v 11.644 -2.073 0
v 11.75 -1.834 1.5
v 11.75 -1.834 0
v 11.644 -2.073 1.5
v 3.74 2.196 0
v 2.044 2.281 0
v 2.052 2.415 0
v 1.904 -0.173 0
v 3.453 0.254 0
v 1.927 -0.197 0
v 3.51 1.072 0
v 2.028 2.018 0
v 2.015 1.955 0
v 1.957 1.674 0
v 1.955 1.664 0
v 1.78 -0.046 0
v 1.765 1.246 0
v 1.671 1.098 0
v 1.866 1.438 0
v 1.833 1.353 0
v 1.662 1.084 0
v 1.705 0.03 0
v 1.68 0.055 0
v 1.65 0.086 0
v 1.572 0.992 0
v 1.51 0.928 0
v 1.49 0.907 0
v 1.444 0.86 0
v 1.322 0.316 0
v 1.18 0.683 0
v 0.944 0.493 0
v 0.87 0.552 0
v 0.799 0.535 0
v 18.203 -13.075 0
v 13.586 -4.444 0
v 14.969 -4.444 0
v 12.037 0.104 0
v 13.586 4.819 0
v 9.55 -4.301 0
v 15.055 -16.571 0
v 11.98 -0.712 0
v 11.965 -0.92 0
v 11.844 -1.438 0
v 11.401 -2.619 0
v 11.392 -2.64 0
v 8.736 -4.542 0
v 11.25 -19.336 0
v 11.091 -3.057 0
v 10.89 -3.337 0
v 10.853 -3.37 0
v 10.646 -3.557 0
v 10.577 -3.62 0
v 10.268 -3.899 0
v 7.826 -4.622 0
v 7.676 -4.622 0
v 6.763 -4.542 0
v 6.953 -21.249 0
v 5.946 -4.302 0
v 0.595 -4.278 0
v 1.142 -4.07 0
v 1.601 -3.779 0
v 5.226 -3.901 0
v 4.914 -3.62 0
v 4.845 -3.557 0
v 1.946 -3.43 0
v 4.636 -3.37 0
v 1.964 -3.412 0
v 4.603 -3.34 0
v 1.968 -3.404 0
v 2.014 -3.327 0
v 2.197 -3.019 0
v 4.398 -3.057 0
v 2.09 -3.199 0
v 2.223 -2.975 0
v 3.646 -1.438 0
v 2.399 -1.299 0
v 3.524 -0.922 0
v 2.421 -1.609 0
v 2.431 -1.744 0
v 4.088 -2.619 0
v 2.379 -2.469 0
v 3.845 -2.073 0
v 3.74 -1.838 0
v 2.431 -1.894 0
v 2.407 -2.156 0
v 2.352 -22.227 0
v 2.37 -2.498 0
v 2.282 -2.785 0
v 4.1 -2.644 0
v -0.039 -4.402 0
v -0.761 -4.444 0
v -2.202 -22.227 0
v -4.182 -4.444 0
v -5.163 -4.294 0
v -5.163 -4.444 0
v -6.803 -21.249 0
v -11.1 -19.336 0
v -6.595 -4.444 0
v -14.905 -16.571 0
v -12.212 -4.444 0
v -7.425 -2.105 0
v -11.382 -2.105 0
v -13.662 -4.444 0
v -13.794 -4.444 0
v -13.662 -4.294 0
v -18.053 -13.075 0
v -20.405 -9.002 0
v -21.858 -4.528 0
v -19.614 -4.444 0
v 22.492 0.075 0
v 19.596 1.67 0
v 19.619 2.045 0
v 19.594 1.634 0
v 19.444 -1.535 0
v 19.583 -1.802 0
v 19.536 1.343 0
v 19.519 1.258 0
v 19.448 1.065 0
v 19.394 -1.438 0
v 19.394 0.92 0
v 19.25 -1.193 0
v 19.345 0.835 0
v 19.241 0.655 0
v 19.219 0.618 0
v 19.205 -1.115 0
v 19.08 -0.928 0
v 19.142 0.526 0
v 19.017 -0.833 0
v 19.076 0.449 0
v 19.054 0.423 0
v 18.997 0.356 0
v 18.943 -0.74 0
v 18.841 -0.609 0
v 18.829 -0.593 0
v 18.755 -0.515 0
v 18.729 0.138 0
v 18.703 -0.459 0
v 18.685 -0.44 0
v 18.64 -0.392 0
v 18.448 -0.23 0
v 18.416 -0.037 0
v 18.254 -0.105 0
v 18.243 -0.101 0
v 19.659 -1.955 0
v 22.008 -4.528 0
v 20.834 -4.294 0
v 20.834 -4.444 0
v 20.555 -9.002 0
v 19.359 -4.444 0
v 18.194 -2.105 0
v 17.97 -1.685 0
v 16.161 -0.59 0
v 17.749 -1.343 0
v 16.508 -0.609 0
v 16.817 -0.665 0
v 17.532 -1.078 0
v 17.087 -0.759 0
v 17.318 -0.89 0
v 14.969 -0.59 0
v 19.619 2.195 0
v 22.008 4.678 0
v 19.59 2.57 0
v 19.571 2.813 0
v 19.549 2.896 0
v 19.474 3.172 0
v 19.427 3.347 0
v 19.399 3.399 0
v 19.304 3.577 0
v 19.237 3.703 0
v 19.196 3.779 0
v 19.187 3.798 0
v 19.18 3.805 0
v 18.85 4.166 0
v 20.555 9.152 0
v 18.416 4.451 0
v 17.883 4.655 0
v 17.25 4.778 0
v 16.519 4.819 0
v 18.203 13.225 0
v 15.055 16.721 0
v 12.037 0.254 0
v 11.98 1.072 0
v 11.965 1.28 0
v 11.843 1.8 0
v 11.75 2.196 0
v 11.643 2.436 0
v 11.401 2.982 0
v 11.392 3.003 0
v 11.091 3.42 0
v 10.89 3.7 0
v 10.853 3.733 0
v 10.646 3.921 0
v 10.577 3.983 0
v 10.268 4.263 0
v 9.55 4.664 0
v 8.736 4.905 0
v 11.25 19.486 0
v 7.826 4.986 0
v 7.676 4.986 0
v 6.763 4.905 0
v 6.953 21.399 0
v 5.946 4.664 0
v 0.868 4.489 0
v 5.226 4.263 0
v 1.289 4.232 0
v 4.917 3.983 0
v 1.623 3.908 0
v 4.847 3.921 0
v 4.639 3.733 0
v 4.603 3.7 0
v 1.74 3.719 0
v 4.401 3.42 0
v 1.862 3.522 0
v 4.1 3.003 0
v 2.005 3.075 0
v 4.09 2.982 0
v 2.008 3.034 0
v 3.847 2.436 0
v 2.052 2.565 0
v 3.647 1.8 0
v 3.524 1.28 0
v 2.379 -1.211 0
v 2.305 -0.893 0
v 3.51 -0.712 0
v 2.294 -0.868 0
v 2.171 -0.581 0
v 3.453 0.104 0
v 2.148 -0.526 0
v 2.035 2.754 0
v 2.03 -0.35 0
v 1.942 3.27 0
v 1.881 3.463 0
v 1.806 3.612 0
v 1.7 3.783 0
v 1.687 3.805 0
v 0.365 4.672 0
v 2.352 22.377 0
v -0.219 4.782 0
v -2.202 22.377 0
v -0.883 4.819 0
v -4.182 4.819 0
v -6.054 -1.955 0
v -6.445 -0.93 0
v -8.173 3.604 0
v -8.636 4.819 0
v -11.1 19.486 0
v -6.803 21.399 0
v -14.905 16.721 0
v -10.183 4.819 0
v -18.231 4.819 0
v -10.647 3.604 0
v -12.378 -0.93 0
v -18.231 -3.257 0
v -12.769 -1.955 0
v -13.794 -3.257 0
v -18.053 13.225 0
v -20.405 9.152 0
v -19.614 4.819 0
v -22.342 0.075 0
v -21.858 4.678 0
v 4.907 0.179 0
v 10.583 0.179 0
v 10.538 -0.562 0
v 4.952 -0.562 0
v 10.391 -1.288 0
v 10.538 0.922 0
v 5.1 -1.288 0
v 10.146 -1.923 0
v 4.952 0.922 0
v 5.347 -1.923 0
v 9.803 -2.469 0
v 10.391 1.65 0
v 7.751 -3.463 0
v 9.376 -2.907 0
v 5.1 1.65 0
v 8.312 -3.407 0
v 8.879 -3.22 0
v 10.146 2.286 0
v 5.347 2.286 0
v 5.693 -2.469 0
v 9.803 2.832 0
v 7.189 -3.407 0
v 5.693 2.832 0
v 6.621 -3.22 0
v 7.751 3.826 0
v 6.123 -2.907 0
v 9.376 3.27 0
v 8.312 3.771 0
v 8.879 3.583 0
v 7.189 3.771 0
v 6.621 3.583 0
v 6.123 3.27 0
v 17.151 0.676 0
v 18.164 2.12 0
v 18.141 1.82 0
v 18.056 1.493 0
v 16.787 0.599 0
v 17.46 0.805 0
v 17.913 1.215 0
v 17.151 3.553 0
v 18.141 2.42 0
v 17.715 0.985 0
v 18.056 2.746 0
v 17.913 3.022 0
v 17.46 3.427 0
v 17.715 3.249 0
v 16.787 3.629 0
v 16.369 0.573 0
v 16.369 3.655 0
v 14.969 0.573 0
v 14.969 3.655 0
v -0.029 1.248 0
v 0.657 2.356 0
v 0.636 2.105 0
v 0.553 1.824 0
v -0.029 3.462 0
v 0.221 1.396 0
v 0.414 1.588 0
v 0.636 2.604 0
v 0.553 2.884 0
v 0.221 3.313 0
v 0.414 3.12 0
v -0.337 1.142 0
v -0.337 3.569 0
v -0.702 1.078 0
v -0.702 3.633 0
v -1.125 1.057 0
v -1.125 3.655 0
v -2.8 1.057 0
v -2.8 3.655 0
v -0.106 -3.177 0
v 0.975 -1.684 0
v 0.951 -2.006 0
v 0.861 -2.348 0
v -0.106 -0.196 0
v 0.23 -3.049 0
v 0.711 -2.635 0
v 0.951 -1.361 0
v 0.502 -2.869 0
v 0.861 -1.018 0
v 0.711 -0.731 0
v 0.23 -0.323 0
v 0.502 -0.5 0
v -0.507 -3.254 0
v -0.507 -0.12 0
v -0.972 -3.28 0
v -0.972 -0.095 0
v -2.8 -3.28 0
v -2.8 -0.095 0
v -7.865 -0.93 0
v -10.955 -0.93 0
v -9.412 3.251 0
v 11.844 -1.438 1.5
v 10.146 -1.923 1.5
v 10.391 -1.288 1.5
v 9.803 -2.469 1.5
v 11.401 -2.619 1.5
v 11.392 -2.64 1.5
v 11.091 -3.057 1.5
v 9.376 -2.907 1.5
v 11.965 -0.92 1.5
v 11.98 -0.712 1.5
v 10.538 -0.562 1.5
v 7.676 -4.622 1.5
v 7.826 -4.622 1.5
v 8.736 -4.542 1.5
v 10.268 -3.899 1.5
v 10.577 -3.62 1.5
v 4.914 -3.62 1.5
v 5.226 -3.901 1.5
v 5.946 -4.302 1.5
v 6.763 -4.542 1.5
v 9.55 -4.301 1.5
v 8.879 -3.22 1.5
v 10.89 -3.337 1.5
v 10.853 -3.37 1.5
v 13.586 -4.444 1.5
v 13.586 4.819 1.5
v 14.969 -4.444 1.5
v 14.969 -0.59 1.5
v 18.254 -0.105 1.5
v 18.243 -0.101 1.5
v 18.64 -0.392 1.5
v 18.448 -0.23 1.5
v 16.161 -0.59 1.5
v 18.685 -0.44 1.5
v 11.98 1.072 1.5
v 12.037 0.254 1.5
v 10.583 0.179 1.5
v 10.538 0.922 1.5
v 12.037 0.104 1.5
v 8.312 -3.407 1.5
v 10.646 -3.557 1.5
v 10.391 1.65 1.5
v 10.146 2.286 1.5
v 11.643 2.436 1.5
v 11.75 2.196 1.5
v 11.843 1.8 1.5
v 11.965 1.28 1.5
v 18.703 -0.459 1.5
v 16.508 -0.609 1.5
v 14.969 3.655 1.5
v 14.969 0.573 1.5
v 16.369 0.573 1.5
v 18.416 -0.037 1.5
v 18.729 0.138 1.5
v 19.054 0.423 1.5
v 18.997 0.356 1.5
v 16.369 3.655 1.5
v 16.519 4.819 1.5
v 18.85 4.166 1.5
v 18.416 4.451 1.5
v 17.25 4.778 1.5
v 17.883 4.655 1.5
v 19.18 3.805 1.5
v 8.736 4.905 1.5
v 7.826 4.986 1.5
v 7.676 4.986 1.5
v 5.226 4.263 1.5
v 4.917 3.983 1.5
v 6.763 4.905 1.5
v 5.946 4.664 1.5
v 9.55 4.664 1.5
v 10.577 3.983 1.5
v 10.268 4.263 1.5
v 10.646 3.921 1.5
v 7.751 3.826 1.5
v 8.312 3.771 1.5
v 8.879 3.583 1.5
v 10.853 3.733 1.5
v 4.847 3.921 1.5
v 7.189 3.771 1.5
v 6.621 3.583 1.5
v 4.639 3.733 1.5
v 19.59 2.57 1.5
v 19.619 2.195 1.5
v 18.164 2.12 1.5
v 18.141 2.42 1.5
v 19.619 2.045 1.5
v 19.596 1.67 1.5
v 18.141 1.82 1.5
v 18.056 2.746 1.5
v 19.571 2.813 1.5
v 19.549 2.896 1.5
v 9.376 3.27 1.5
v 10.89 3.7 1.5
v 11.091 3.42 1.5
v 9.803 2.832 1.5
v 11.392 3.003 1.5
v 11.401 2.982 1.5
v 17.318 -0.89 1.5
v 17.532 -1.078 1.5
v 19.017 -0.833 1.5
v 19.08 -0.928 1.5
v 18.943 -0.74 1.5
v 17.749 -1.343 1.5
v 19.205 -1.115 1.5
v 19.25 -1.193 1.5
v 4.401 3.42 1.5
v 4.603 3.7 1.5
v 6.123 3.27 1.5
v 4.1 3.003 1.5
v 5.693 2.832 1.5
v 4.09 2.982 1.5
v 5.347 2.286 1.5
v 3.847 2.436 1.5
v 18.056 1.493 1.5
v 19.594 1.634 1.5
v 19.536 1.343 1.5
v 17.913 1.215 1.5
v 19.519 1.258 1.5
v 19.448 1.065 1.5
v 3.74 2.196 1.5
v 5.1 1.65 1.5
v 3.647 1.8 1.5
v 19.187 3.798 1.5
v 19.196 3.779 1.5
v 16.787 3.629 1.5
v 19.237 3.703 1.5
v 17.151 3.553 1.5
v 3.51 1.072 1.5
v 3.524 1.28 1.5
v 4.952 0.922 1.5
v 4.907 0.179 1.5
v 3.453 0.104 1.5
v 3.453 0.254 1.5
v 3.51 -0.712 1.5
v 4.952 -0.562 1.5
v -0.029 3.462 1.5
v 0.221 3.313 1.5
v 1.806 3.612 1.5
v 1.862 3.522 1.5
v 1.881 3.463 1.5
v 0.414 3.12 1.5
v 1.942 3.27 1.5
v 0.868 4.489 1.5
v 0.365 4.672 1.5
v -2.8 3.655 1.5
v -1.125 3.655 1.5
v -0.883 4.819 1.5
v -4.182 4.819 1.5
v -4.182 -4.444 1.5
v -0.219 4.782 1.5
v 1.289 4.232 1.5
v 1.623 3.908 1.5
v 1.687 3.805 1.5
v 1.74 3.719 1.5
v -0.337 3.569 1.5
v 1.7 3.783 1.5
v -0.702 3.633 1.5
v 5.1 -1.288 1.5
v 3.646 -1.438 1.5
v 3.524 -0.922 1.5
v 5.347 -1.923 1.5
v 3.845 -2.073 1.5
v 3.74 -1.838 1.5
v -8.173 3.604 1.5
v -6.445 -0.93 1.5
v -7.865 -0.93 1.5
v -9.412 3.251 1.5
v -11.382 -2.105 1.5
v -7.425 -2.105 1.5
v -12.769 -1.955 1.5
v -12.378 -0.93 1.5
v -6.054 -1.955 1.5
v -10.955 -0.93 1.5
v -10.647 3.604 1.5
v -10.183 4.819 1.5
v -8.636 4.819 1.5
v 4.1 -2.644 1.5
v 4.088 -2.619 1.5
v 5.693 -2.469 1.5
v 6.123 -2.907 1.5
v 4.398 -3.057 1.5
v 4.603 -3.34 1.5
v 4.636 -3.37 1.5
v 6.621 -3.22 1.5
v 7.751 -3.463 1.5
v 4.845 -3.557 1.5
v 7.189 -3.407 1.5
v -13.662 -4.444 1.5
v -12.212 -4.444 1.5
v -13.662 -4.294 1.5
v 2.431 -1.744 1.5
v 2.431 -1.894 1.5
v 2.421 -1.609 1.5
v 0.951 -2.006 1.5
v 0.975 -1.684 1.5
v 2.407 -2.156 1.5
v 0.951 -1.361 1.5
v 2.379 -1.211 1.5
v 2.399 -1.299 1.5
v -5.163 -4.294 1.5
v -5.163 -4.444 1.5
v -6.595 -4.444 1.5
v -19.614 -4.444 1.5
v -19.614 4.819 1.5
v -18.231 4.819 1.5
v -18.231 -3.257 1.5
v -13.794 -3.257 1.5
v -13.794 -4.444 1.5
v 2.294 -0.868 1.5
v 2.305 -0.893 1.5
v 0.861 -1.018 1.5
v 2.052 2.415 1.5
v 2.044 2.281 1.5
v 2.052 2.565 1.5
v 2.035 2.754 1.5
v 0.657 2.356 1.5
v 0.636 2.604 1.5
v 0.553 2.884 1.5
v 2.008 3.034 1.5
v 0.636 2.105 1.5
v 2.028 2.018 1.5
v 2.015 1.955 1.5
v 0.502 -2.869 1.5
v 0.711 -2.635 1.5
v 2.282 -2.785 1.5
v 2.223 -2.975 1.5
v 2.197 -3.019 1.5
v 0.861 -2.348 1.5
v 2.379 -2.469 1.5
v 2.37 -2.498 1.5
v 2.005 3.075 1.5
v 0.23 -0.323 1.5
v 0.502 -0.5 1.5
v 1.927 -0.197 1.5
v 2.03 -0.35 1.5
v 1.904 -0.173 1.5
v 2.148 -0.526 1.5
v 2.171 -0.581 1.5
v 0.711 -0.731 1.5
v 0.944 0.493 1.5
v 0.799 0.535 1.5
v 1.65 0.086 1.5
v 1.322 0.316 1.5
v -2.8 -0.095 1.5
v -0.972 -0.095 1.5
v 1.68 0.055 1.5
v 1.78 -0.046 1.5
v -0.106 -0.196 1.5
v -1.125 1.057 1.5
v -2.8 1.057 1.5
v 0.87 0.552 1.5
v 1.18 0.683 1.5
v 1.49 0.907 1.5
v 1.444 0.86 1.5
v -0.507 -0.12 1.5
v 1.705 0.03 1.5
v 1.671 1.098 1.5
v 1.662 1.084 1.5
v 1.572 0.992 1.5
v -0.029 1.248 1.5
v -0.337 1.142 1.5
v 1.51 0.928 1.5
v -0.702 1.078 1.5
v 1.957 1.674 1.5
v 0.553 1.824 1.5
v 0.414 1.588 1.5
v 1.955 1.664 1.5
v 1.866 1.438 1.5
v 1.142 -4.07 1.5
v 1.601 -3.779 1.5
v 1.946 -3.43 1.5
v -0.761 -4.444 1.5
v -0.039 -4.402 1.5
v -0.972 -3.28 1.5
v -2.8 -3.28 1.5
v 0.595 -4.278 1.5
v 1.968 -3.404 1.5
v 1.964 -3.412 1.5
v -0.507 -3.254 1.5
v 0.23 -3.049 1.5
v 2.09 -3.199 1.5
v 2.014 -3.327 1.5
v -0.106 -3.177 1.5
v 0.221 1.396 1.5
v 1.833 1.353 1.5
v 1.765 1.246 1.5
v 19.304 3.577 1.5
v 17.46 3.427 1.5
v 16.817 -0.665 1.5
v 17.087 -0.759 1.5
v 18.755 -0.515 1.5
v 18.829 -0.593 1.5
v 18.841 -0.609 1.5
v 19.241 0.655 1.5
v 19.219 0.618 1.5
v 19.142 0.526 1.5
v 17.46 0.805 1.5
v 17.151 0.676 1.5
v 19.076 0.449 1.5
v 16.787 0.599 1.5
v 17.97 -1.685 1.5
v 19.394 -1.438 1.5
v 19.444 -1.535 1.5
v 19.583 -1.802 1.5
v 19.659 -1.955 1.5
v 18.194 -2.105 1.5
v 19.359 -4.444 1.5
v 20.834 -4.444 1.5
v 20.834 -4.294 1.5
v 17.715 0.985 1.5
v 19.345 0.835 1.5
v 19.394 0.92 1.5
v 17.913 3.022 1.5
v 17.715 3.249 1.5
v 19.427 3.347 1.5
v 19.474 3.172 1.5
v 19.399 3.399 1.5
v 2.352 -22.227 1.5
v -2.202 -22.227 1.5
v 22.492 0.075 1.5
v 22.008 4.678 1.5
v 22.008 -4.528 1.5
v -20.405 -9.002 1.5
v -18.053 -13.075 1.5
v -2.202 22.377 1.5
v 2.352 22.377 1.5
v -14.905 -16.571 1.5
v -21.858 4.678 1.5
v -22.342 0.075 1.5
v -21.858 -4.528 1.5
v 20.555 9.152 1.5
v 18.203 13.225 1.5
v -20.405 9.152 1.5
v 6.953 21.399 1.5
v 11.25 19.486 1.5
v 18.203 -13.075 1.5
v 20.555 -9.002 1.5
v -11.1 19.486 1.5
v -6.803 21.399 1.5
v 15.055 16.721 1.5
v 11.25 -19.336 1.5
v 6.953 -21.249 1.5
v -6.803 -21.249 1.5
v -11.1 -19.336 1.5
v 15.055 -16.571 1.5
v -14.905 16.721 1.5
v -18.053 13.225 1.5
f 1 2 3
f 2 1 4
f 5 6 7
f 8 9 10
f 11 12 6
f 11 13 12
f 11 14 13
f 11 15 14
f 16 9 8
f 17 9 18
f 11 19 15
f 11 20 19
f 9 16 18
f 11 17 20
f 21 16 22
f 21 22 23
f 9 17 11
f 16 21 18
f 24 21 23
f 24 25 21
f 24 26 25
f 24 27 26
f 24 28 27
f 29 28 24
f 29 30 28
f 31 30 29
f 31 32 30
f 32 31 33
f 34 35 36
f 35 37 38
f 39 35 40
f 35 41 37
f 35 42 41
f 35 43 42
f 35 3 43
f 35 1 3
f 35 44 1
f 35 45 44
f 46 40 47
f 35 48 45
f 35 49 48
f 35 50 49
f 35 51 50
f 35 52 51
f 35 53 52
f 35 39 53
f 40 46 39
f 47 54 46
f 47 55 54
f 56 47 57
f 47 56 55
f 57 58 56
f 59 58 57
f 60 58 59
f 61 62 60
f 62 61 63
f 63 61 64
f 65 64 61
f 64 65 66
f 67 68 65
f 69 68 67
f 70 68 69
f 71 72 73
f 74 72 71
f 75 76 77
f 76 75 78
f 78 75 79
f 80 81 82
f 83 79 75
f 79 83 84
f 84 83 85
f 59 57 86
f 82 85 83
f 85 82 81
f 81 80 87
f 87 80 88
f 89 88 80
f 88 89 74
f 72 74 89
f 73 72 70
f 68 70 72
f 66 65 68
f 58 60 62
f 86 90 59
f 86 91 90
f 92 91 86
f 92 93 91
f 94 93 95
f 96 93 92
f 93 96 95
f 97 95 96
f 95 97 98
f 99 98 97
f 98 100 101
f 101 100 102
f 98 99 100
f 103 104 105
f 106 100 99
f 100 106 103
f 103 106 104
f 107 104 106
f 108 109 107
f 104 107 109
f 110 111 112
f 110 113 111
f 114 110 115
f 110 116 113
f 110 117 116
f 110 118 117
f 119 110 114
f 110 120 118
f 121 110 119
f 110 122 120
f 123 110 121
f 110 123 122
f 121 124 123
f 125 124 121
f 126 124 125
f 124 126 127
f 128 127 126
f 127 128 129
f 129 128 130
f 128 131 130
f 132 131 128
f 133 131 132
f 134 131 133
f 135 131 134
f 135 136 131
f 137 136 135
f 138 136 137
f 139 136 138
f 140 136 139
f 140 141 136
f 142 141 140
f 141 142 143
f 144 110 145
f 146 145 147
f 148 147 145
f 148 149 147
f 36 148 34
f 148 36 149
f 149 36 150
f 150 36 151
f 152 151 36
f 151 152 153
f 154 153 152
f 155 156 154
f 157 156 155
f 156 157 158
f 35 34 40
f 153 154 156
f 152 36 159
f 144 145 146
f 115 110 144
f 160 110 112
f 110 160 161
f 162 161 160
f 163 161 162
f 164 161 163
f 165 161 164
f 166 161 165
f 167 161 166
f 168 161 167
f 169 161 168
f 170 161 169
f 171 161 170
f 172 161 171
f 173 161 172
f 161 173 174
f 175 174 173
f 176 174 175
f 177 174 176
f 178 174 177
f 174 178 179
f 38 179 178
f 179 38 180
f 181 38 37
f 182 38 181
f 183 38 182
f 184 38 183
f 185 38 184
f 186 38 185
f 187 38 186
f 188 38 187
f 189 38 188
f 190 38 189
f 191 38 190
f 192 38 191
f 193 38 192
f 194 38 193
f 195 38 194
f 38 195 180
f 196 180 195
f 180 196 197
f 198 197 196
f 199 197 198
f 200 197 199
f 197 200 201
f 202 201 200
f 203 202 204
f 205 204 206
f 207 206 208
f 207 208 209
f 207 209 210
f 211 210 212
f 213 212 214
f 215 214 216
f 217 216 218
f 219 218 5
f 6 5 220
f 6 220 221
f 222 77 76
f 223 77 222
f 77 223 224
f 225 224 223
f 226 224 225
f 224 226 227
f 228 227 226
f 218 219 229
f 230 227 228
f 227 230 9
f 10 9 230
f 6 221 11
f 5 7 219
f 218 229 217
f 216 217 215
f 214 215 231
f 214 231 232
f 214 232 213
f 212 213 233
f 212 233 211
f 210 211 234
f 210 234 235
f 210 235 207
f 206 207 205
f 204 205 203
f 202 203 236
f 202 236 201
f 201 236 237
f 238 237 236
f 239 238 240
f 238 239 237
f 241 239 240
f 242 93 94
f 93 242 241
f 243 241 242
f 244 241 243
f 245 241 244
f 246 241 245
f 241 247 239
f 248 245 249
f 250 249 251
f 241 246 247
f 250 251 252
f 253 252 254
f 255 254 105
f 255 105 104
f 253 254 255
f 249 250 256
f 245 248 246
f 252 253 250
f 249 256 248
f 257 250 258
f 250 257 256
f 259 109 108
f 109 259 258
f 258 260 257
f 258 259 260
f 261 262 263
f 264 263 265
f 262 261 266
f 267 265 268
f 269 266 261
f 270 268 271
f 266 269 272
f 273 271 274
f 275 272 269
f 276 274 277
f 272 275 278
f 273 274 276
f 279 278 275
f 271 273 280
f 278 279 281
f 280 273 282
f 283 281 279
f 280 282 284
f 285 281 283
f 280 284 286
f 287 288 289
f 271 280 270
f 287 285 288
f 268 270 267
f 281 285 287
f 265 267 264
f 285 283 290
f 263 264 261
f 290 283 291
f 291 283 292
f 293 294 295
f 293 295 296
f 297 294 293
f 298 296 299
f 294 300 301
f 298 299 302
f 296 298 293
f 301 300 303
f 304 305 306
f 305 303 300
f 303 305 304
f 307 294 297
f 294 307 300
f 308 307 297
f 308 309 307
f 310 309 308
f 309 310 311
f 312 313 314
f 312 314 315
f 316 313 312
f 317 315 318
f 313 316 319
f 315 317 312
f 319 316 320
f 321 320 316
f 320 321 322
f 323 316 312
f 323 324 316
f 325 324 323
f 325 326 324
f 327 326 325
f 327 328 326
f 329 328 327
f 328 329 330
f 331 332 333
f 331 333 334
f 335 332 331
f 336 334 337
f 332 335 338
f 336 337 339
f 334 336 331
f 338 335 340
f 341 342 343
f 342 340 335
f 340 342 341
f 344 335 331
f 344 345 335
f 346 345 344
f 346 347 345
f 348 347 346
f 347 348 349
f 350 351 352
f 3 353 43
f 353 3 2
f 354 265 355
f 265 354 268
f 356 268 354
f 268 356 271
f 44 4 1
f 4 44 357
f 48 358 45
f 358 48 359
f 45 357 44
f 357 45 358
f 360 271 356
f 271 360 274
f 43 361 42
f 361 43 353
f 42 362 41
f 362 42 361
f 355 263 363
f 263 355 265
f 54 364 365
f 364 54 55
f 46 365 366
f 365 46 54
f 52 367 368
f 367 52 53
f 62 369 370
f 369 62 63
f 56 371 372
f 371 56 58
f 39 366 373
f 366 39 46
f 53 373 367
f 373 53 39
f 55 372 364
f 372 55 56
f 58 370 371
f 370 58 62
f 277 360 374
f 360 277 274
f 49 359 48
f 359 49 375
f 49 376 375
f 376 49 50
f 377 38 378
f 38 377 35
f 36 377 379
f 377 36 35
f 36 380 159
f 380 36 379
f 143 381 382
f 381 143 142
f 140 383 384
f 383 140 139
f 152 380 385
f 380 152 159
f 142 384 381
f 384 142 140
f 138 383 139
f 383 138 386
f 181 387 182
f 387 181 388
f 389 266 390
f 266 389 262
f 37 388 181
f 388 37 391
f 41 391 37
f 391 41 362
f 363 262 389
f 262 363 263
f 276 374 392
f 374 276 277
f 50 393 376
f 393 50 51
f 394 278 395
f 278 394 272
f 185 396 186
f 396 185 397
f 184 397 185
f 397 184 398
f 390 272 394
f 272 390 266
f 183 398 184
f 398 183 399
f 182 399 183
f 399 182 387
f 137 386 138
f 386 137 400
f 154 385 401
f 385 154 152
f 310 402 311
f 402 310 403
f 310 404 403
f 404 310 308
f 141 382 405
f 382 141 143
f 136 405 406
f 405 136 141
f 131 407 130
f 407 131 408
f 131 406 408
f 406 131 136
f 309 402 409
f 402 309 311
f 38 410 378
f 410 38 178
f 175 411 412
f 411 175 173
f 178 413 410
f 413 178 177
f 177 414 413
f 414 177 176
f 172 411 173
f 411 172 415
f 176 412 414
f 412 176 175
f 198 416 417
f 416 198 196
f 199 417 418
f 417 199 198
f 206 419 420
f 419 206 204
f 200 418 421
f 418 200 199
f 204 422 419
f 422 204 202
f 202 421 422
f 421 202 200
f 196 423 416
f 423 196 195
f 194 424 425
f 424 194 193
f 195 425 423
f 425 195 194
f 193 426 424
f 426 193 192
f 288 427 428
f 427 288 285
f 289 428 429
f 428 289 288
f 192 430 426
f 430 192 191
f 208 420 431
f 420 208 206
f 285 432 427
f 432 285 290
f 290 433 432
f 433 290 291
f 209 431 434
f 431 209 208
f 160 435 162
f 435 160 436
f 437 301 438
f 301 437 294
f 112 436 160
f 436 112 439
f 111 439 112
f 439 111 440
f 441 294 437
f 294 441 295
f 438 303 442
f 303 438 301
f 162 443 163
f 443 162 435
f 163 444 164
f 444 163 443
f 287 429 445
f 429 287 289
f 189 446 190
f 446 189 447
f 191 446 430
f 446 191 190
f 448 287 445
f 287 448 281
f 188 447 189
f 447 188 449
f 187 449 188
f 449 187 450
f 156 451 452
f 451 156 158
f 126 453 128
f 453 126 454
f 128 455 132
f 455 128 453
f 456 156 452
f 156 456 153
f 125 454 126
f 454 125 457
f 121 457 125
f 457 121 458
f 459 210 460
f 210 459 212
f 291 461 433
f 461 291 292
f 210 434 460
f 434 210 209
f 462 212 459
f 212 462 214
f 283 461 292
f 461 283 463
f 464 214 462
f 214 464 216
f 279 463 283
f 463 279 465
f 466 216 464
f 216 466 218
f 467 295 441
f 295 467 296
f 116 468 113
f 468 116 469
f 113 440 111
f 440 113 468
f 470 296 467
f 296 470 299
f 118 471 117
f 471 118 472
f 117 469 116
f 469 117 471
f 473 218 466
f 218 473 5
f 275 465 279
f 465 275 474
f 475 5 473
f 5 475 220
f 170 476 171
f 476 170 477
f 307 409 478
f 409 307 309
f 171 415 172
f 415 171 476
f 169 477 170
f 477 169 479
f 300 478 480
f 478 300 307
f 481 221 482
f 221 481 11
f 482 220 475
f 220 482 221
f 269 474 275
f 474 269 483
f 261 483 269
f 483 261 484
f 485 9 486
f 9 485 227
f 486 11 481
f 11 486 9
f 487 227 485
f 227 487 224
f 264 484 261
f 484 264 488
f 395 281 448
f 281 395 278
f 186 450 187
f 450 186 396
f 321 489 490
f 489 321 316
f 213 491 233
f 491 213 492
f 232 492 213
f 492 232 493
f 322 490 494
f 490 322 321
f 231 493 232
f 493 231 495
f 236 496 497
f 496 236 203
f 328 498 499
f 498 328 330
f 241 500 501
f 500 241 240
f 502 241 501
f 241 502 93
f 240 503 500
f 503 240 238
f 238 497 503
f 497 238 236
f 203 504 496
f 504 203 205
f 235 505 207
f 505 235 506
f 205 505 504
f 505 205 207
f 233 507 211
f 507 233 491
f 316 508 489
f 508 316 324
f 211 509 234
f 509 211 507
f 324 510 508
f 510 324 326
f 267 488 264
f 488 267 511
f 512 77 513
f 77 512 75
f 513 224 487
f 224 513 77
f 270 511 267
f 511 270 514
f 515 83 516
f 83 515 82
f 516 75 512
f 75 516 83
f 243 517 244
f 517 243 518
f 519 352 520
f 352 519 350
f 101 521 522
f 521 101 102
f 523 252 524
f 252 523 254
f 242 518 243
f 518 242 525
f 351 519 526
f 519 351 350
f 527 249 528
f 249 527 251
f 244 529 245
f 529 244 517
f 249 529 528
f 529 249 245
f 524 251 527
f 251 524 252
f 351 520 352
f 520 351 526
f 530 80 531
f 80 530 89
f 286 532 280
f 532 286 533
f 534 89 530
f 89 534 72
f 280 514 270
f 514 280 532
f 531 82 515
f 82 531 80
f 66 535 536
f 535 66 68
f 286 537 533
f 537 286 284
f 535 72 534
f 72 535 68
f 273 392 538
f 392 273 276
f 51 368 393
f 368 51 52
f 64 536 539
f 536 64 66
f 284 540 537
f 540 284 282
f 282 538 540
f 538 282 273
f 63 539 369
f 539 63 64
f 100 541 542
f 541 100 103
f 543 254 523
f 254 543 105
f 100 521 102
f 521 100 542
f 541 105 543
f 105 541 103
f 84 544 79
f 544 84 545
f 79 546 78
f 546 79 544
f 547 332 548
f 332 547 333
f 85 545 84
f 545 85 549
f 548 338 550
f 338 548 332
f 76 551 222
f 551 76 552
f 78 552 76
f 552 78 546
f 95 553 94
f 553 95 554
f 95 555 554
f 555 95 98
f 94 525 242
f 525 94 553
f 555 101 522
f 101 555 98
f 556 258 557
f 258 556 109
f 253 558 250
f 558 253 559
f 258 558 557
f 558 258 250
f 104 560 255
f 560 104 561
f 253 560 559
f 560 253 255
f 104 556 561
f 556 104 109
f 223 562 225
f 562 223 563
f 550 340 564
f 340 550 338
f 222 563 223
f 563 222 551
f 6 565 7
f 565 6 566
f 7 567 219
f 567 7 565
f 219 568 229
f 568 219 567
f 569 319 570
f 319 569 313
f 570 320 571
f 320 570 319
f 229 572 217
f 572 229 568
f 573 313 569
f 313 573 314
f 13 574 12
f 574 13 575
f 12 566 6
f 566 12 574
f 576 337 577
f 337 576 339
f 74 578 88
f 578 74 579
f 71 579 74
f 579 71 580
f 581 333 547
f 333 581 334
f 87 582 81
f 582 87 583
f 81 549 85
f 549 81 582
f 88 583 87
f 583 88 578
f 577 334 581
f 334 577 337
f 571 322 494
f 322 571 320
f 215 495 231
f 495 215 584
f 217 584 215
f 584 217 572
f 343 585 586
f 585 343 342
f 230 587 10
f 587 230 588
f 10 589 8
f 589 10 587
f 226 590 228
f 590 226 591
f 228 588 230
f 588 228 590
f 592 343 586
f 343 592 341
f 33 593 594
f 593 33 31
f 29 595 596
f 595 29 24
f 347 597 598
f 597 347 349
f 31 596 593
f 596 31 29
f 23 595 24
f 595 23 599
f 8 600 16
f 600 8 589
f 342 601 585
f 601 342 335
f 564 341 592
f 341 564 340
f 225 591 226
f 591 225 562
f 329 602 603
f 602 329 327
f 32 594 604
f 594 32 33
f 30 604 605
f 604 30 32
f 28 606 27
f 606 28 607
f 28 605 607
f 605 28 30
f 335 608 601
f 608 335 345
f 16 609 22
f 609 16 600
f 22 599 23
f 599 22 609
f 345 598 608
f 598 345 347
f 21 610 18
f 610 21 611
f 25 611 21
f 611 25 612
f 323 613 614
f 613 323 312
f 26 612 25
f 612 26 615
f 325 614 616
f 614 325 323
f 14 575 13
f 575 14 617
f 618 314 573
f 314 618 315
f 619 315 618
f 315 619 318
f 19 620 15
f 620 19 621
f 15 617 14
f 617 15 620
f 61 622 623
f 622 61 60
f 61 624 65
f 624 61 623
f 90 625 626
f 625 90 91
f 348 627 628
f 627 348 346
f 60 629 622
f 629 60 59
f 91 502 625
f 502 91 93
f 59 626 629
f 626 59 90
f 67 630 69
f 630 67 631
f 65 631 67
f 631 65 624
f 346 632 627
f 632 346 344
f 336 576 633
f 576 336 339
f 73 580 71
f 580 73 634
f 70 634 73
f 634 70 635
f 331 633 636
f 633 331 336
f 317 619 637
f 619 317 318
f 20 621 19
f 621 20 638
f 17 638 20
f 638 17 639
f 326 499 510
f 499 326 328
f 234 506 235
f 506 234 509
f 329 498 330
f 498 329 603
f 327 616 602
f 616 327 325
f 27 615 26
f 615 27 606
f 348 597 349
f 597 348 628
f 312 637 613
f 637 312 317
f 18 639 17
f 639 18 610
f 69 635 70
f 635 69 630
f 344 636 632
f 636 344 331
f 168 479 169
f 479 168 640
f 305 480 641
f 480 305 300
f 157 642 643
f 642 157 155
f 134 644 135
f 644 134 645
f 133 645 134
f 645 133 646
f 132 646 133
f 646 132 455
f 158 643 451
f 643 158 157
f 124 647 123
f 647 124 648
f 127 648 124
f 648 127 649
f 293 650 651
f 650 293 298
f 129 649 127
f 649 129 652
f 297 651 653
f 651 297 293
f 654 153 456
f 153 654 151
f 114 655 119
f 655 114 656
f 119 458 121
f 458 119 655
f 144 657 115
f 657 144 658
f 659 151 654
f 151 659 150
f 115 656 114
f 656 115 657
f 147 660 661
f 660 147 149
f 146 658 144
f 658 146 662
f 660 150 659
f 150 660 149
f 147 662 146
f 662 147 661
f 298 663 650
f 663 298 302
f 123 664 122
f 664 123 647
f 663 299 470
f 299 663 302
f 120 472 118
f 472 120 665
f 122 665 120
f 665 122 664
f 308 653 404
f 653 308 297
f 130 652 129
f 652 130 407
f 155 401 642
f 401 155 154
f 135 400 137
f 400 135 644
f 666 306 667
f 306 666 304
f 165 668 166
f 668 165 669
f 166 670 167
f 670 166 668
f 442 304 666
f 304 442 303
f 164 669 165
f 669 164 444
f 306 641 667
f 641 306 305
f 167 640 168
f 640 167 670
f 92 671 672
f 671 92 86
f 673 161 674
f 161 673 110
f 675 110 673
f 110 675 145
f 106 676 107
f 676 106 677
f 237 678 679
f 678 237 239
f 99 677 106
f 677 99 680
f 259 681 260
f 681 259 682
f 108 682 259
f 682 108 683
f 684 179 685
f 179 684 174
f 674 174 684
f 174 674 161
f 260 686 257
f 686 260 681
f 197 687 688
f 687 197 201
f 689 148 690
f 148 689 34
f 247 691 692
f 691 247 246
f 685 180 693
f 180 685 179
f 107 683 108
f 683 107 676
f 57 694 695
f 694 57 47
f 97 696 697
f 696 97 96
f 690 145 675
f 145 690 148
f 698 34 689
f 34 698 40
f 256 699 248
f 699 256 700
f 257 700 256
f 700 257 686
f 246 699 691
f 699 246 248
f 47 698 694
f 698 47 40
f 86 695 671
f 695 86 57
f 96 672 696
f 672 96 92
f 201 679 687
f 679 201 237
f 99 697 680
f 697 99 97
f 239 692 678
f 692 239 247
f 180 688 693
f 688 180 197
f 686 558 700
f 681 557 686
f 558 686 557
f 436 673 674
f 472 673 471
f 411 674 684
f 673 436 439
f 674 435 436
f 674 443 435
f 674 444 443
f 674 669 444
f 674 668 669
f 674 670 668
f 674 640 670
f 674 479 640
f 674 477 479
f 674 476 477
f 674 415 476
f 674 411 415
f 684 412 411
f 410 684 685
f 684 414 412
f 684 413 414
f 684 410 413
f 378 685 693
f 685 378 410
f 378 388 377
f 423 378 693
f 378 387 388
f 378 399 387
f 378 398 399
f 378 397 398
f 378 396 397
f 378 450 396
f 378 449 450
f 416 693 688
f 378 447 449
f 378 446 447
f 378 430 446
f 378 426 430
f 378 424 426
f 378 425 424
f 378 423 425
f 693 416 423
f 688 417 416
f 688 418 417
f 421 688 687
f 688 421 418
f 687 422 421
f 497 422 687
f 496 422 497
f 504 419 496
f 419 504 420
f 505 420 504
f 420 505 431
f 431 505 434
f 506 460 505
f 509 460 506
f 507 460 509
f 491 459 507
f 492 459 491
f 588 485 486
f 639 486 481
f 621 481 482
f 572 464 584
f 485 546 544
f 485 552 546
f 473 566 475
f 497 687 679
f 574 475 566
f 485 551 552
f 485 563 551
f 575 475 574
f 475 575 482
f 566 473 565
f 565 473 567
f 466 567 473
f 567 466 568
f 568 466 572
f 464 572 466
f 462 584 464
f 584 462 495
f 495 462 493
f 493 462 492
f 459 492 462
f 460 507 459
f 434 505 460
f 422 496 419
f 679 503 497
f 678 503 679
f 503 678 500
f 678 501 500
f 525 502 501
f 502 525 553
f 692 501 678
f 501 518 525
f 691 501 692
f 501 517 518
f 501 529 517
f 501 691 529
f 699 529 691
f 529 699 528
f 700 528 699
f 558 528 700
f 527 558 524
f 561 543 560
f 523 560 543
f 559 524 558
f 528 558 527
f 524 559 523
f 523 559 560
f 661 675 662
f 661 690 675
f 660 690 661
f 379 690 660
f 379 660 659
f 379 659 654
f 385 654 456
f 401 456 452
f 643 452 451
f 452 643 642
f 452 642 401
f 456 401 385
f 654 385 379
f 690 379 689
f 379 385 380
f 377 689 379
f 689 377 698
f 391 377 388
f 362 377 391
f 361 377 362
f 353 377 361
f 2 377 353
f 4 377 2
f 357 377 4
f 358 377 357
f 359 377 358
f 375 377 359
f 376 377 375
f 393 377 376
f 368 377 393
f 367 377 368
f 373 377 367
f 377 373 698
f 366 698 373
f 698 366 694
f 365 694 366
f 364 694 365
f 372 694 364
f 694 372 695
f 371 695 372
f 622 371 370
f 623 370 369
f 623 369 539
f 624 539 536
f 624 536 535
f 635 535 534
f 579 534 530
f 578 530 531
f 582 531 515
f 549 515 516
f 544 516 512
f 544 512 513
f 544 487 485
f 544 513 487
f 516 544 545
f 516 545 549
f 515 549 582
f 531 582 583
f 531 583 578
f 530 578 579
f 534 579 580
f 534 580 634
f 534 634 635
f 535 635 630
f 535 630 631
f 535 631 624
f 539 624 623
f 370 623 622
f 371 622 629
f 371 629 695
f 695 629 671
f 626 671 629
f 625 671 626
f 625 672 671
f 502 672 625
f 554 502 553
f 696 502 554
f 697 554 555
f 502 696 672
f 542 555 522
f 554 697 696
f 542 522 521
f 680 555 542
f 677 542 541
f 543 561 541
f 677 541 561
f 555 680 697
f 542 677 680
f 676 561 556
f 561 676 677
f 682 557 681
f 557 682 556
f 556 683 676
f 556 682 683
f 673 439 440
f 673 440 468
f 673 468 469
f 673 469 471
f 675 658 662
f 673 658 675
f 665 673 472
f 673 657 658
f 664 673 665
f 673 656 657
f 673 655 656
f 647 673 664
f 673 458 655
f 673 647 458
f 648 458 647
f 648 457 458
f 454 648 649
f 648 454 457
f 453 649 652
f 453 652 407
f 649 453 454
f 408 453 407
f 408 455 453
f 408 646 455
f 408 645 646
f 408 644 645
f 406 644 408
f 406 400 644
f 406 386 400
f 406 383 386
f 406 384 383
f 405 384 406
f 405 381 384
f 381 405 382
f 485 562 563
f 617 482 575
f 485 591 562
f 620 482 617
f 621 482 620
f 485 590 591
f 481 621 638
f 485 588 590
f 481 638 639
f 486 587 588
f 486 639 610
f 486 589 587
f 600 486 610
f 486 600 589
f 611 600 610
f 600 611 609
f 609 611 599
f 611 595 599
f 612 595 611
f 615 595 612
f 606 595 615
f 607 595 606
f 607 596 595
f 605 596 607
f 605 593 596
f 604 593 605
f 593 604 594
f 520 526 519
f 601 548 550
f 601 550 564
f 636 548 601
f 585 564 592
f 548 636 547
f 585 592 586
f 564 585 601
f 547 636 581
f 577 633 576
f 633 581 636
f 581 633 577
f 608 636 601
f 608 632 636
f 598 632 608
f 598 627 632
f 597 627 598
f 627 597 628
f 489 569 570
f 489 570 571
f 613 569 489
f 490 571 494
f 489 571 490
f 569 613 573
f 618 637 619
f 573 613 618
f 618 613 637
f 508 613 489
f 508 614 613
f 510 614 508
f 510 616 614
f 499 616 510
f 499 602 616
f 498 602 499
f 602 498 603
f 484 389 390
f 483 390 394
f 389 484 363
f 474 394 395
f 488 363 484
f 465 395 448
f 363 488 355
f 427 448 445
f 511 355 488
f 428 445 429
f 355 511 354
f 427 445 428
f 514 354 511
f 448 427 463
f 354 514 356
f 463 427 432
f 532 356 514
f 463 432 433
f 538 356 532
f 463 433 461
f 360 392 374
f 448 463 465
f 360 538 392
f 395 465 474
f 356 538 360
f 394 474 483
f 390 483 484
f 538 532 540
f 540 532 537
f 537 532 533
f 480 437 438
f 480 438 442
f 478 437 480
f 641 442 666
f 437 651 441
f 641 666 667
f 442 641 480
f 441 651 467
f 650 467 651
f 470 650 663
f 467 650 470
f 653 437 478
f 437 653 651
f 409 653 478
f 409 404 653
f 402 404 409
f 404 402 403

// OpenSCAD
difference() {
	cylinder(h = 1.5, r = 22.5);
	minkowski() {
		linear_extrude(height = 2.25) {
			text(font = "Mic 32Bold", halign = "center", size = 9, text = "LABOR", valign = "center");
		}
		cube(size = [0.15, 0.15, 0.15]);
	}
	minkowski() {
		difference() {
			cylinder(h = 3.0, r = 27.0);
			cylinder(h = 3.0, r = 22.5);
		}
		cube(size = [0.15, 0.15, 0.15]);
	}
}
